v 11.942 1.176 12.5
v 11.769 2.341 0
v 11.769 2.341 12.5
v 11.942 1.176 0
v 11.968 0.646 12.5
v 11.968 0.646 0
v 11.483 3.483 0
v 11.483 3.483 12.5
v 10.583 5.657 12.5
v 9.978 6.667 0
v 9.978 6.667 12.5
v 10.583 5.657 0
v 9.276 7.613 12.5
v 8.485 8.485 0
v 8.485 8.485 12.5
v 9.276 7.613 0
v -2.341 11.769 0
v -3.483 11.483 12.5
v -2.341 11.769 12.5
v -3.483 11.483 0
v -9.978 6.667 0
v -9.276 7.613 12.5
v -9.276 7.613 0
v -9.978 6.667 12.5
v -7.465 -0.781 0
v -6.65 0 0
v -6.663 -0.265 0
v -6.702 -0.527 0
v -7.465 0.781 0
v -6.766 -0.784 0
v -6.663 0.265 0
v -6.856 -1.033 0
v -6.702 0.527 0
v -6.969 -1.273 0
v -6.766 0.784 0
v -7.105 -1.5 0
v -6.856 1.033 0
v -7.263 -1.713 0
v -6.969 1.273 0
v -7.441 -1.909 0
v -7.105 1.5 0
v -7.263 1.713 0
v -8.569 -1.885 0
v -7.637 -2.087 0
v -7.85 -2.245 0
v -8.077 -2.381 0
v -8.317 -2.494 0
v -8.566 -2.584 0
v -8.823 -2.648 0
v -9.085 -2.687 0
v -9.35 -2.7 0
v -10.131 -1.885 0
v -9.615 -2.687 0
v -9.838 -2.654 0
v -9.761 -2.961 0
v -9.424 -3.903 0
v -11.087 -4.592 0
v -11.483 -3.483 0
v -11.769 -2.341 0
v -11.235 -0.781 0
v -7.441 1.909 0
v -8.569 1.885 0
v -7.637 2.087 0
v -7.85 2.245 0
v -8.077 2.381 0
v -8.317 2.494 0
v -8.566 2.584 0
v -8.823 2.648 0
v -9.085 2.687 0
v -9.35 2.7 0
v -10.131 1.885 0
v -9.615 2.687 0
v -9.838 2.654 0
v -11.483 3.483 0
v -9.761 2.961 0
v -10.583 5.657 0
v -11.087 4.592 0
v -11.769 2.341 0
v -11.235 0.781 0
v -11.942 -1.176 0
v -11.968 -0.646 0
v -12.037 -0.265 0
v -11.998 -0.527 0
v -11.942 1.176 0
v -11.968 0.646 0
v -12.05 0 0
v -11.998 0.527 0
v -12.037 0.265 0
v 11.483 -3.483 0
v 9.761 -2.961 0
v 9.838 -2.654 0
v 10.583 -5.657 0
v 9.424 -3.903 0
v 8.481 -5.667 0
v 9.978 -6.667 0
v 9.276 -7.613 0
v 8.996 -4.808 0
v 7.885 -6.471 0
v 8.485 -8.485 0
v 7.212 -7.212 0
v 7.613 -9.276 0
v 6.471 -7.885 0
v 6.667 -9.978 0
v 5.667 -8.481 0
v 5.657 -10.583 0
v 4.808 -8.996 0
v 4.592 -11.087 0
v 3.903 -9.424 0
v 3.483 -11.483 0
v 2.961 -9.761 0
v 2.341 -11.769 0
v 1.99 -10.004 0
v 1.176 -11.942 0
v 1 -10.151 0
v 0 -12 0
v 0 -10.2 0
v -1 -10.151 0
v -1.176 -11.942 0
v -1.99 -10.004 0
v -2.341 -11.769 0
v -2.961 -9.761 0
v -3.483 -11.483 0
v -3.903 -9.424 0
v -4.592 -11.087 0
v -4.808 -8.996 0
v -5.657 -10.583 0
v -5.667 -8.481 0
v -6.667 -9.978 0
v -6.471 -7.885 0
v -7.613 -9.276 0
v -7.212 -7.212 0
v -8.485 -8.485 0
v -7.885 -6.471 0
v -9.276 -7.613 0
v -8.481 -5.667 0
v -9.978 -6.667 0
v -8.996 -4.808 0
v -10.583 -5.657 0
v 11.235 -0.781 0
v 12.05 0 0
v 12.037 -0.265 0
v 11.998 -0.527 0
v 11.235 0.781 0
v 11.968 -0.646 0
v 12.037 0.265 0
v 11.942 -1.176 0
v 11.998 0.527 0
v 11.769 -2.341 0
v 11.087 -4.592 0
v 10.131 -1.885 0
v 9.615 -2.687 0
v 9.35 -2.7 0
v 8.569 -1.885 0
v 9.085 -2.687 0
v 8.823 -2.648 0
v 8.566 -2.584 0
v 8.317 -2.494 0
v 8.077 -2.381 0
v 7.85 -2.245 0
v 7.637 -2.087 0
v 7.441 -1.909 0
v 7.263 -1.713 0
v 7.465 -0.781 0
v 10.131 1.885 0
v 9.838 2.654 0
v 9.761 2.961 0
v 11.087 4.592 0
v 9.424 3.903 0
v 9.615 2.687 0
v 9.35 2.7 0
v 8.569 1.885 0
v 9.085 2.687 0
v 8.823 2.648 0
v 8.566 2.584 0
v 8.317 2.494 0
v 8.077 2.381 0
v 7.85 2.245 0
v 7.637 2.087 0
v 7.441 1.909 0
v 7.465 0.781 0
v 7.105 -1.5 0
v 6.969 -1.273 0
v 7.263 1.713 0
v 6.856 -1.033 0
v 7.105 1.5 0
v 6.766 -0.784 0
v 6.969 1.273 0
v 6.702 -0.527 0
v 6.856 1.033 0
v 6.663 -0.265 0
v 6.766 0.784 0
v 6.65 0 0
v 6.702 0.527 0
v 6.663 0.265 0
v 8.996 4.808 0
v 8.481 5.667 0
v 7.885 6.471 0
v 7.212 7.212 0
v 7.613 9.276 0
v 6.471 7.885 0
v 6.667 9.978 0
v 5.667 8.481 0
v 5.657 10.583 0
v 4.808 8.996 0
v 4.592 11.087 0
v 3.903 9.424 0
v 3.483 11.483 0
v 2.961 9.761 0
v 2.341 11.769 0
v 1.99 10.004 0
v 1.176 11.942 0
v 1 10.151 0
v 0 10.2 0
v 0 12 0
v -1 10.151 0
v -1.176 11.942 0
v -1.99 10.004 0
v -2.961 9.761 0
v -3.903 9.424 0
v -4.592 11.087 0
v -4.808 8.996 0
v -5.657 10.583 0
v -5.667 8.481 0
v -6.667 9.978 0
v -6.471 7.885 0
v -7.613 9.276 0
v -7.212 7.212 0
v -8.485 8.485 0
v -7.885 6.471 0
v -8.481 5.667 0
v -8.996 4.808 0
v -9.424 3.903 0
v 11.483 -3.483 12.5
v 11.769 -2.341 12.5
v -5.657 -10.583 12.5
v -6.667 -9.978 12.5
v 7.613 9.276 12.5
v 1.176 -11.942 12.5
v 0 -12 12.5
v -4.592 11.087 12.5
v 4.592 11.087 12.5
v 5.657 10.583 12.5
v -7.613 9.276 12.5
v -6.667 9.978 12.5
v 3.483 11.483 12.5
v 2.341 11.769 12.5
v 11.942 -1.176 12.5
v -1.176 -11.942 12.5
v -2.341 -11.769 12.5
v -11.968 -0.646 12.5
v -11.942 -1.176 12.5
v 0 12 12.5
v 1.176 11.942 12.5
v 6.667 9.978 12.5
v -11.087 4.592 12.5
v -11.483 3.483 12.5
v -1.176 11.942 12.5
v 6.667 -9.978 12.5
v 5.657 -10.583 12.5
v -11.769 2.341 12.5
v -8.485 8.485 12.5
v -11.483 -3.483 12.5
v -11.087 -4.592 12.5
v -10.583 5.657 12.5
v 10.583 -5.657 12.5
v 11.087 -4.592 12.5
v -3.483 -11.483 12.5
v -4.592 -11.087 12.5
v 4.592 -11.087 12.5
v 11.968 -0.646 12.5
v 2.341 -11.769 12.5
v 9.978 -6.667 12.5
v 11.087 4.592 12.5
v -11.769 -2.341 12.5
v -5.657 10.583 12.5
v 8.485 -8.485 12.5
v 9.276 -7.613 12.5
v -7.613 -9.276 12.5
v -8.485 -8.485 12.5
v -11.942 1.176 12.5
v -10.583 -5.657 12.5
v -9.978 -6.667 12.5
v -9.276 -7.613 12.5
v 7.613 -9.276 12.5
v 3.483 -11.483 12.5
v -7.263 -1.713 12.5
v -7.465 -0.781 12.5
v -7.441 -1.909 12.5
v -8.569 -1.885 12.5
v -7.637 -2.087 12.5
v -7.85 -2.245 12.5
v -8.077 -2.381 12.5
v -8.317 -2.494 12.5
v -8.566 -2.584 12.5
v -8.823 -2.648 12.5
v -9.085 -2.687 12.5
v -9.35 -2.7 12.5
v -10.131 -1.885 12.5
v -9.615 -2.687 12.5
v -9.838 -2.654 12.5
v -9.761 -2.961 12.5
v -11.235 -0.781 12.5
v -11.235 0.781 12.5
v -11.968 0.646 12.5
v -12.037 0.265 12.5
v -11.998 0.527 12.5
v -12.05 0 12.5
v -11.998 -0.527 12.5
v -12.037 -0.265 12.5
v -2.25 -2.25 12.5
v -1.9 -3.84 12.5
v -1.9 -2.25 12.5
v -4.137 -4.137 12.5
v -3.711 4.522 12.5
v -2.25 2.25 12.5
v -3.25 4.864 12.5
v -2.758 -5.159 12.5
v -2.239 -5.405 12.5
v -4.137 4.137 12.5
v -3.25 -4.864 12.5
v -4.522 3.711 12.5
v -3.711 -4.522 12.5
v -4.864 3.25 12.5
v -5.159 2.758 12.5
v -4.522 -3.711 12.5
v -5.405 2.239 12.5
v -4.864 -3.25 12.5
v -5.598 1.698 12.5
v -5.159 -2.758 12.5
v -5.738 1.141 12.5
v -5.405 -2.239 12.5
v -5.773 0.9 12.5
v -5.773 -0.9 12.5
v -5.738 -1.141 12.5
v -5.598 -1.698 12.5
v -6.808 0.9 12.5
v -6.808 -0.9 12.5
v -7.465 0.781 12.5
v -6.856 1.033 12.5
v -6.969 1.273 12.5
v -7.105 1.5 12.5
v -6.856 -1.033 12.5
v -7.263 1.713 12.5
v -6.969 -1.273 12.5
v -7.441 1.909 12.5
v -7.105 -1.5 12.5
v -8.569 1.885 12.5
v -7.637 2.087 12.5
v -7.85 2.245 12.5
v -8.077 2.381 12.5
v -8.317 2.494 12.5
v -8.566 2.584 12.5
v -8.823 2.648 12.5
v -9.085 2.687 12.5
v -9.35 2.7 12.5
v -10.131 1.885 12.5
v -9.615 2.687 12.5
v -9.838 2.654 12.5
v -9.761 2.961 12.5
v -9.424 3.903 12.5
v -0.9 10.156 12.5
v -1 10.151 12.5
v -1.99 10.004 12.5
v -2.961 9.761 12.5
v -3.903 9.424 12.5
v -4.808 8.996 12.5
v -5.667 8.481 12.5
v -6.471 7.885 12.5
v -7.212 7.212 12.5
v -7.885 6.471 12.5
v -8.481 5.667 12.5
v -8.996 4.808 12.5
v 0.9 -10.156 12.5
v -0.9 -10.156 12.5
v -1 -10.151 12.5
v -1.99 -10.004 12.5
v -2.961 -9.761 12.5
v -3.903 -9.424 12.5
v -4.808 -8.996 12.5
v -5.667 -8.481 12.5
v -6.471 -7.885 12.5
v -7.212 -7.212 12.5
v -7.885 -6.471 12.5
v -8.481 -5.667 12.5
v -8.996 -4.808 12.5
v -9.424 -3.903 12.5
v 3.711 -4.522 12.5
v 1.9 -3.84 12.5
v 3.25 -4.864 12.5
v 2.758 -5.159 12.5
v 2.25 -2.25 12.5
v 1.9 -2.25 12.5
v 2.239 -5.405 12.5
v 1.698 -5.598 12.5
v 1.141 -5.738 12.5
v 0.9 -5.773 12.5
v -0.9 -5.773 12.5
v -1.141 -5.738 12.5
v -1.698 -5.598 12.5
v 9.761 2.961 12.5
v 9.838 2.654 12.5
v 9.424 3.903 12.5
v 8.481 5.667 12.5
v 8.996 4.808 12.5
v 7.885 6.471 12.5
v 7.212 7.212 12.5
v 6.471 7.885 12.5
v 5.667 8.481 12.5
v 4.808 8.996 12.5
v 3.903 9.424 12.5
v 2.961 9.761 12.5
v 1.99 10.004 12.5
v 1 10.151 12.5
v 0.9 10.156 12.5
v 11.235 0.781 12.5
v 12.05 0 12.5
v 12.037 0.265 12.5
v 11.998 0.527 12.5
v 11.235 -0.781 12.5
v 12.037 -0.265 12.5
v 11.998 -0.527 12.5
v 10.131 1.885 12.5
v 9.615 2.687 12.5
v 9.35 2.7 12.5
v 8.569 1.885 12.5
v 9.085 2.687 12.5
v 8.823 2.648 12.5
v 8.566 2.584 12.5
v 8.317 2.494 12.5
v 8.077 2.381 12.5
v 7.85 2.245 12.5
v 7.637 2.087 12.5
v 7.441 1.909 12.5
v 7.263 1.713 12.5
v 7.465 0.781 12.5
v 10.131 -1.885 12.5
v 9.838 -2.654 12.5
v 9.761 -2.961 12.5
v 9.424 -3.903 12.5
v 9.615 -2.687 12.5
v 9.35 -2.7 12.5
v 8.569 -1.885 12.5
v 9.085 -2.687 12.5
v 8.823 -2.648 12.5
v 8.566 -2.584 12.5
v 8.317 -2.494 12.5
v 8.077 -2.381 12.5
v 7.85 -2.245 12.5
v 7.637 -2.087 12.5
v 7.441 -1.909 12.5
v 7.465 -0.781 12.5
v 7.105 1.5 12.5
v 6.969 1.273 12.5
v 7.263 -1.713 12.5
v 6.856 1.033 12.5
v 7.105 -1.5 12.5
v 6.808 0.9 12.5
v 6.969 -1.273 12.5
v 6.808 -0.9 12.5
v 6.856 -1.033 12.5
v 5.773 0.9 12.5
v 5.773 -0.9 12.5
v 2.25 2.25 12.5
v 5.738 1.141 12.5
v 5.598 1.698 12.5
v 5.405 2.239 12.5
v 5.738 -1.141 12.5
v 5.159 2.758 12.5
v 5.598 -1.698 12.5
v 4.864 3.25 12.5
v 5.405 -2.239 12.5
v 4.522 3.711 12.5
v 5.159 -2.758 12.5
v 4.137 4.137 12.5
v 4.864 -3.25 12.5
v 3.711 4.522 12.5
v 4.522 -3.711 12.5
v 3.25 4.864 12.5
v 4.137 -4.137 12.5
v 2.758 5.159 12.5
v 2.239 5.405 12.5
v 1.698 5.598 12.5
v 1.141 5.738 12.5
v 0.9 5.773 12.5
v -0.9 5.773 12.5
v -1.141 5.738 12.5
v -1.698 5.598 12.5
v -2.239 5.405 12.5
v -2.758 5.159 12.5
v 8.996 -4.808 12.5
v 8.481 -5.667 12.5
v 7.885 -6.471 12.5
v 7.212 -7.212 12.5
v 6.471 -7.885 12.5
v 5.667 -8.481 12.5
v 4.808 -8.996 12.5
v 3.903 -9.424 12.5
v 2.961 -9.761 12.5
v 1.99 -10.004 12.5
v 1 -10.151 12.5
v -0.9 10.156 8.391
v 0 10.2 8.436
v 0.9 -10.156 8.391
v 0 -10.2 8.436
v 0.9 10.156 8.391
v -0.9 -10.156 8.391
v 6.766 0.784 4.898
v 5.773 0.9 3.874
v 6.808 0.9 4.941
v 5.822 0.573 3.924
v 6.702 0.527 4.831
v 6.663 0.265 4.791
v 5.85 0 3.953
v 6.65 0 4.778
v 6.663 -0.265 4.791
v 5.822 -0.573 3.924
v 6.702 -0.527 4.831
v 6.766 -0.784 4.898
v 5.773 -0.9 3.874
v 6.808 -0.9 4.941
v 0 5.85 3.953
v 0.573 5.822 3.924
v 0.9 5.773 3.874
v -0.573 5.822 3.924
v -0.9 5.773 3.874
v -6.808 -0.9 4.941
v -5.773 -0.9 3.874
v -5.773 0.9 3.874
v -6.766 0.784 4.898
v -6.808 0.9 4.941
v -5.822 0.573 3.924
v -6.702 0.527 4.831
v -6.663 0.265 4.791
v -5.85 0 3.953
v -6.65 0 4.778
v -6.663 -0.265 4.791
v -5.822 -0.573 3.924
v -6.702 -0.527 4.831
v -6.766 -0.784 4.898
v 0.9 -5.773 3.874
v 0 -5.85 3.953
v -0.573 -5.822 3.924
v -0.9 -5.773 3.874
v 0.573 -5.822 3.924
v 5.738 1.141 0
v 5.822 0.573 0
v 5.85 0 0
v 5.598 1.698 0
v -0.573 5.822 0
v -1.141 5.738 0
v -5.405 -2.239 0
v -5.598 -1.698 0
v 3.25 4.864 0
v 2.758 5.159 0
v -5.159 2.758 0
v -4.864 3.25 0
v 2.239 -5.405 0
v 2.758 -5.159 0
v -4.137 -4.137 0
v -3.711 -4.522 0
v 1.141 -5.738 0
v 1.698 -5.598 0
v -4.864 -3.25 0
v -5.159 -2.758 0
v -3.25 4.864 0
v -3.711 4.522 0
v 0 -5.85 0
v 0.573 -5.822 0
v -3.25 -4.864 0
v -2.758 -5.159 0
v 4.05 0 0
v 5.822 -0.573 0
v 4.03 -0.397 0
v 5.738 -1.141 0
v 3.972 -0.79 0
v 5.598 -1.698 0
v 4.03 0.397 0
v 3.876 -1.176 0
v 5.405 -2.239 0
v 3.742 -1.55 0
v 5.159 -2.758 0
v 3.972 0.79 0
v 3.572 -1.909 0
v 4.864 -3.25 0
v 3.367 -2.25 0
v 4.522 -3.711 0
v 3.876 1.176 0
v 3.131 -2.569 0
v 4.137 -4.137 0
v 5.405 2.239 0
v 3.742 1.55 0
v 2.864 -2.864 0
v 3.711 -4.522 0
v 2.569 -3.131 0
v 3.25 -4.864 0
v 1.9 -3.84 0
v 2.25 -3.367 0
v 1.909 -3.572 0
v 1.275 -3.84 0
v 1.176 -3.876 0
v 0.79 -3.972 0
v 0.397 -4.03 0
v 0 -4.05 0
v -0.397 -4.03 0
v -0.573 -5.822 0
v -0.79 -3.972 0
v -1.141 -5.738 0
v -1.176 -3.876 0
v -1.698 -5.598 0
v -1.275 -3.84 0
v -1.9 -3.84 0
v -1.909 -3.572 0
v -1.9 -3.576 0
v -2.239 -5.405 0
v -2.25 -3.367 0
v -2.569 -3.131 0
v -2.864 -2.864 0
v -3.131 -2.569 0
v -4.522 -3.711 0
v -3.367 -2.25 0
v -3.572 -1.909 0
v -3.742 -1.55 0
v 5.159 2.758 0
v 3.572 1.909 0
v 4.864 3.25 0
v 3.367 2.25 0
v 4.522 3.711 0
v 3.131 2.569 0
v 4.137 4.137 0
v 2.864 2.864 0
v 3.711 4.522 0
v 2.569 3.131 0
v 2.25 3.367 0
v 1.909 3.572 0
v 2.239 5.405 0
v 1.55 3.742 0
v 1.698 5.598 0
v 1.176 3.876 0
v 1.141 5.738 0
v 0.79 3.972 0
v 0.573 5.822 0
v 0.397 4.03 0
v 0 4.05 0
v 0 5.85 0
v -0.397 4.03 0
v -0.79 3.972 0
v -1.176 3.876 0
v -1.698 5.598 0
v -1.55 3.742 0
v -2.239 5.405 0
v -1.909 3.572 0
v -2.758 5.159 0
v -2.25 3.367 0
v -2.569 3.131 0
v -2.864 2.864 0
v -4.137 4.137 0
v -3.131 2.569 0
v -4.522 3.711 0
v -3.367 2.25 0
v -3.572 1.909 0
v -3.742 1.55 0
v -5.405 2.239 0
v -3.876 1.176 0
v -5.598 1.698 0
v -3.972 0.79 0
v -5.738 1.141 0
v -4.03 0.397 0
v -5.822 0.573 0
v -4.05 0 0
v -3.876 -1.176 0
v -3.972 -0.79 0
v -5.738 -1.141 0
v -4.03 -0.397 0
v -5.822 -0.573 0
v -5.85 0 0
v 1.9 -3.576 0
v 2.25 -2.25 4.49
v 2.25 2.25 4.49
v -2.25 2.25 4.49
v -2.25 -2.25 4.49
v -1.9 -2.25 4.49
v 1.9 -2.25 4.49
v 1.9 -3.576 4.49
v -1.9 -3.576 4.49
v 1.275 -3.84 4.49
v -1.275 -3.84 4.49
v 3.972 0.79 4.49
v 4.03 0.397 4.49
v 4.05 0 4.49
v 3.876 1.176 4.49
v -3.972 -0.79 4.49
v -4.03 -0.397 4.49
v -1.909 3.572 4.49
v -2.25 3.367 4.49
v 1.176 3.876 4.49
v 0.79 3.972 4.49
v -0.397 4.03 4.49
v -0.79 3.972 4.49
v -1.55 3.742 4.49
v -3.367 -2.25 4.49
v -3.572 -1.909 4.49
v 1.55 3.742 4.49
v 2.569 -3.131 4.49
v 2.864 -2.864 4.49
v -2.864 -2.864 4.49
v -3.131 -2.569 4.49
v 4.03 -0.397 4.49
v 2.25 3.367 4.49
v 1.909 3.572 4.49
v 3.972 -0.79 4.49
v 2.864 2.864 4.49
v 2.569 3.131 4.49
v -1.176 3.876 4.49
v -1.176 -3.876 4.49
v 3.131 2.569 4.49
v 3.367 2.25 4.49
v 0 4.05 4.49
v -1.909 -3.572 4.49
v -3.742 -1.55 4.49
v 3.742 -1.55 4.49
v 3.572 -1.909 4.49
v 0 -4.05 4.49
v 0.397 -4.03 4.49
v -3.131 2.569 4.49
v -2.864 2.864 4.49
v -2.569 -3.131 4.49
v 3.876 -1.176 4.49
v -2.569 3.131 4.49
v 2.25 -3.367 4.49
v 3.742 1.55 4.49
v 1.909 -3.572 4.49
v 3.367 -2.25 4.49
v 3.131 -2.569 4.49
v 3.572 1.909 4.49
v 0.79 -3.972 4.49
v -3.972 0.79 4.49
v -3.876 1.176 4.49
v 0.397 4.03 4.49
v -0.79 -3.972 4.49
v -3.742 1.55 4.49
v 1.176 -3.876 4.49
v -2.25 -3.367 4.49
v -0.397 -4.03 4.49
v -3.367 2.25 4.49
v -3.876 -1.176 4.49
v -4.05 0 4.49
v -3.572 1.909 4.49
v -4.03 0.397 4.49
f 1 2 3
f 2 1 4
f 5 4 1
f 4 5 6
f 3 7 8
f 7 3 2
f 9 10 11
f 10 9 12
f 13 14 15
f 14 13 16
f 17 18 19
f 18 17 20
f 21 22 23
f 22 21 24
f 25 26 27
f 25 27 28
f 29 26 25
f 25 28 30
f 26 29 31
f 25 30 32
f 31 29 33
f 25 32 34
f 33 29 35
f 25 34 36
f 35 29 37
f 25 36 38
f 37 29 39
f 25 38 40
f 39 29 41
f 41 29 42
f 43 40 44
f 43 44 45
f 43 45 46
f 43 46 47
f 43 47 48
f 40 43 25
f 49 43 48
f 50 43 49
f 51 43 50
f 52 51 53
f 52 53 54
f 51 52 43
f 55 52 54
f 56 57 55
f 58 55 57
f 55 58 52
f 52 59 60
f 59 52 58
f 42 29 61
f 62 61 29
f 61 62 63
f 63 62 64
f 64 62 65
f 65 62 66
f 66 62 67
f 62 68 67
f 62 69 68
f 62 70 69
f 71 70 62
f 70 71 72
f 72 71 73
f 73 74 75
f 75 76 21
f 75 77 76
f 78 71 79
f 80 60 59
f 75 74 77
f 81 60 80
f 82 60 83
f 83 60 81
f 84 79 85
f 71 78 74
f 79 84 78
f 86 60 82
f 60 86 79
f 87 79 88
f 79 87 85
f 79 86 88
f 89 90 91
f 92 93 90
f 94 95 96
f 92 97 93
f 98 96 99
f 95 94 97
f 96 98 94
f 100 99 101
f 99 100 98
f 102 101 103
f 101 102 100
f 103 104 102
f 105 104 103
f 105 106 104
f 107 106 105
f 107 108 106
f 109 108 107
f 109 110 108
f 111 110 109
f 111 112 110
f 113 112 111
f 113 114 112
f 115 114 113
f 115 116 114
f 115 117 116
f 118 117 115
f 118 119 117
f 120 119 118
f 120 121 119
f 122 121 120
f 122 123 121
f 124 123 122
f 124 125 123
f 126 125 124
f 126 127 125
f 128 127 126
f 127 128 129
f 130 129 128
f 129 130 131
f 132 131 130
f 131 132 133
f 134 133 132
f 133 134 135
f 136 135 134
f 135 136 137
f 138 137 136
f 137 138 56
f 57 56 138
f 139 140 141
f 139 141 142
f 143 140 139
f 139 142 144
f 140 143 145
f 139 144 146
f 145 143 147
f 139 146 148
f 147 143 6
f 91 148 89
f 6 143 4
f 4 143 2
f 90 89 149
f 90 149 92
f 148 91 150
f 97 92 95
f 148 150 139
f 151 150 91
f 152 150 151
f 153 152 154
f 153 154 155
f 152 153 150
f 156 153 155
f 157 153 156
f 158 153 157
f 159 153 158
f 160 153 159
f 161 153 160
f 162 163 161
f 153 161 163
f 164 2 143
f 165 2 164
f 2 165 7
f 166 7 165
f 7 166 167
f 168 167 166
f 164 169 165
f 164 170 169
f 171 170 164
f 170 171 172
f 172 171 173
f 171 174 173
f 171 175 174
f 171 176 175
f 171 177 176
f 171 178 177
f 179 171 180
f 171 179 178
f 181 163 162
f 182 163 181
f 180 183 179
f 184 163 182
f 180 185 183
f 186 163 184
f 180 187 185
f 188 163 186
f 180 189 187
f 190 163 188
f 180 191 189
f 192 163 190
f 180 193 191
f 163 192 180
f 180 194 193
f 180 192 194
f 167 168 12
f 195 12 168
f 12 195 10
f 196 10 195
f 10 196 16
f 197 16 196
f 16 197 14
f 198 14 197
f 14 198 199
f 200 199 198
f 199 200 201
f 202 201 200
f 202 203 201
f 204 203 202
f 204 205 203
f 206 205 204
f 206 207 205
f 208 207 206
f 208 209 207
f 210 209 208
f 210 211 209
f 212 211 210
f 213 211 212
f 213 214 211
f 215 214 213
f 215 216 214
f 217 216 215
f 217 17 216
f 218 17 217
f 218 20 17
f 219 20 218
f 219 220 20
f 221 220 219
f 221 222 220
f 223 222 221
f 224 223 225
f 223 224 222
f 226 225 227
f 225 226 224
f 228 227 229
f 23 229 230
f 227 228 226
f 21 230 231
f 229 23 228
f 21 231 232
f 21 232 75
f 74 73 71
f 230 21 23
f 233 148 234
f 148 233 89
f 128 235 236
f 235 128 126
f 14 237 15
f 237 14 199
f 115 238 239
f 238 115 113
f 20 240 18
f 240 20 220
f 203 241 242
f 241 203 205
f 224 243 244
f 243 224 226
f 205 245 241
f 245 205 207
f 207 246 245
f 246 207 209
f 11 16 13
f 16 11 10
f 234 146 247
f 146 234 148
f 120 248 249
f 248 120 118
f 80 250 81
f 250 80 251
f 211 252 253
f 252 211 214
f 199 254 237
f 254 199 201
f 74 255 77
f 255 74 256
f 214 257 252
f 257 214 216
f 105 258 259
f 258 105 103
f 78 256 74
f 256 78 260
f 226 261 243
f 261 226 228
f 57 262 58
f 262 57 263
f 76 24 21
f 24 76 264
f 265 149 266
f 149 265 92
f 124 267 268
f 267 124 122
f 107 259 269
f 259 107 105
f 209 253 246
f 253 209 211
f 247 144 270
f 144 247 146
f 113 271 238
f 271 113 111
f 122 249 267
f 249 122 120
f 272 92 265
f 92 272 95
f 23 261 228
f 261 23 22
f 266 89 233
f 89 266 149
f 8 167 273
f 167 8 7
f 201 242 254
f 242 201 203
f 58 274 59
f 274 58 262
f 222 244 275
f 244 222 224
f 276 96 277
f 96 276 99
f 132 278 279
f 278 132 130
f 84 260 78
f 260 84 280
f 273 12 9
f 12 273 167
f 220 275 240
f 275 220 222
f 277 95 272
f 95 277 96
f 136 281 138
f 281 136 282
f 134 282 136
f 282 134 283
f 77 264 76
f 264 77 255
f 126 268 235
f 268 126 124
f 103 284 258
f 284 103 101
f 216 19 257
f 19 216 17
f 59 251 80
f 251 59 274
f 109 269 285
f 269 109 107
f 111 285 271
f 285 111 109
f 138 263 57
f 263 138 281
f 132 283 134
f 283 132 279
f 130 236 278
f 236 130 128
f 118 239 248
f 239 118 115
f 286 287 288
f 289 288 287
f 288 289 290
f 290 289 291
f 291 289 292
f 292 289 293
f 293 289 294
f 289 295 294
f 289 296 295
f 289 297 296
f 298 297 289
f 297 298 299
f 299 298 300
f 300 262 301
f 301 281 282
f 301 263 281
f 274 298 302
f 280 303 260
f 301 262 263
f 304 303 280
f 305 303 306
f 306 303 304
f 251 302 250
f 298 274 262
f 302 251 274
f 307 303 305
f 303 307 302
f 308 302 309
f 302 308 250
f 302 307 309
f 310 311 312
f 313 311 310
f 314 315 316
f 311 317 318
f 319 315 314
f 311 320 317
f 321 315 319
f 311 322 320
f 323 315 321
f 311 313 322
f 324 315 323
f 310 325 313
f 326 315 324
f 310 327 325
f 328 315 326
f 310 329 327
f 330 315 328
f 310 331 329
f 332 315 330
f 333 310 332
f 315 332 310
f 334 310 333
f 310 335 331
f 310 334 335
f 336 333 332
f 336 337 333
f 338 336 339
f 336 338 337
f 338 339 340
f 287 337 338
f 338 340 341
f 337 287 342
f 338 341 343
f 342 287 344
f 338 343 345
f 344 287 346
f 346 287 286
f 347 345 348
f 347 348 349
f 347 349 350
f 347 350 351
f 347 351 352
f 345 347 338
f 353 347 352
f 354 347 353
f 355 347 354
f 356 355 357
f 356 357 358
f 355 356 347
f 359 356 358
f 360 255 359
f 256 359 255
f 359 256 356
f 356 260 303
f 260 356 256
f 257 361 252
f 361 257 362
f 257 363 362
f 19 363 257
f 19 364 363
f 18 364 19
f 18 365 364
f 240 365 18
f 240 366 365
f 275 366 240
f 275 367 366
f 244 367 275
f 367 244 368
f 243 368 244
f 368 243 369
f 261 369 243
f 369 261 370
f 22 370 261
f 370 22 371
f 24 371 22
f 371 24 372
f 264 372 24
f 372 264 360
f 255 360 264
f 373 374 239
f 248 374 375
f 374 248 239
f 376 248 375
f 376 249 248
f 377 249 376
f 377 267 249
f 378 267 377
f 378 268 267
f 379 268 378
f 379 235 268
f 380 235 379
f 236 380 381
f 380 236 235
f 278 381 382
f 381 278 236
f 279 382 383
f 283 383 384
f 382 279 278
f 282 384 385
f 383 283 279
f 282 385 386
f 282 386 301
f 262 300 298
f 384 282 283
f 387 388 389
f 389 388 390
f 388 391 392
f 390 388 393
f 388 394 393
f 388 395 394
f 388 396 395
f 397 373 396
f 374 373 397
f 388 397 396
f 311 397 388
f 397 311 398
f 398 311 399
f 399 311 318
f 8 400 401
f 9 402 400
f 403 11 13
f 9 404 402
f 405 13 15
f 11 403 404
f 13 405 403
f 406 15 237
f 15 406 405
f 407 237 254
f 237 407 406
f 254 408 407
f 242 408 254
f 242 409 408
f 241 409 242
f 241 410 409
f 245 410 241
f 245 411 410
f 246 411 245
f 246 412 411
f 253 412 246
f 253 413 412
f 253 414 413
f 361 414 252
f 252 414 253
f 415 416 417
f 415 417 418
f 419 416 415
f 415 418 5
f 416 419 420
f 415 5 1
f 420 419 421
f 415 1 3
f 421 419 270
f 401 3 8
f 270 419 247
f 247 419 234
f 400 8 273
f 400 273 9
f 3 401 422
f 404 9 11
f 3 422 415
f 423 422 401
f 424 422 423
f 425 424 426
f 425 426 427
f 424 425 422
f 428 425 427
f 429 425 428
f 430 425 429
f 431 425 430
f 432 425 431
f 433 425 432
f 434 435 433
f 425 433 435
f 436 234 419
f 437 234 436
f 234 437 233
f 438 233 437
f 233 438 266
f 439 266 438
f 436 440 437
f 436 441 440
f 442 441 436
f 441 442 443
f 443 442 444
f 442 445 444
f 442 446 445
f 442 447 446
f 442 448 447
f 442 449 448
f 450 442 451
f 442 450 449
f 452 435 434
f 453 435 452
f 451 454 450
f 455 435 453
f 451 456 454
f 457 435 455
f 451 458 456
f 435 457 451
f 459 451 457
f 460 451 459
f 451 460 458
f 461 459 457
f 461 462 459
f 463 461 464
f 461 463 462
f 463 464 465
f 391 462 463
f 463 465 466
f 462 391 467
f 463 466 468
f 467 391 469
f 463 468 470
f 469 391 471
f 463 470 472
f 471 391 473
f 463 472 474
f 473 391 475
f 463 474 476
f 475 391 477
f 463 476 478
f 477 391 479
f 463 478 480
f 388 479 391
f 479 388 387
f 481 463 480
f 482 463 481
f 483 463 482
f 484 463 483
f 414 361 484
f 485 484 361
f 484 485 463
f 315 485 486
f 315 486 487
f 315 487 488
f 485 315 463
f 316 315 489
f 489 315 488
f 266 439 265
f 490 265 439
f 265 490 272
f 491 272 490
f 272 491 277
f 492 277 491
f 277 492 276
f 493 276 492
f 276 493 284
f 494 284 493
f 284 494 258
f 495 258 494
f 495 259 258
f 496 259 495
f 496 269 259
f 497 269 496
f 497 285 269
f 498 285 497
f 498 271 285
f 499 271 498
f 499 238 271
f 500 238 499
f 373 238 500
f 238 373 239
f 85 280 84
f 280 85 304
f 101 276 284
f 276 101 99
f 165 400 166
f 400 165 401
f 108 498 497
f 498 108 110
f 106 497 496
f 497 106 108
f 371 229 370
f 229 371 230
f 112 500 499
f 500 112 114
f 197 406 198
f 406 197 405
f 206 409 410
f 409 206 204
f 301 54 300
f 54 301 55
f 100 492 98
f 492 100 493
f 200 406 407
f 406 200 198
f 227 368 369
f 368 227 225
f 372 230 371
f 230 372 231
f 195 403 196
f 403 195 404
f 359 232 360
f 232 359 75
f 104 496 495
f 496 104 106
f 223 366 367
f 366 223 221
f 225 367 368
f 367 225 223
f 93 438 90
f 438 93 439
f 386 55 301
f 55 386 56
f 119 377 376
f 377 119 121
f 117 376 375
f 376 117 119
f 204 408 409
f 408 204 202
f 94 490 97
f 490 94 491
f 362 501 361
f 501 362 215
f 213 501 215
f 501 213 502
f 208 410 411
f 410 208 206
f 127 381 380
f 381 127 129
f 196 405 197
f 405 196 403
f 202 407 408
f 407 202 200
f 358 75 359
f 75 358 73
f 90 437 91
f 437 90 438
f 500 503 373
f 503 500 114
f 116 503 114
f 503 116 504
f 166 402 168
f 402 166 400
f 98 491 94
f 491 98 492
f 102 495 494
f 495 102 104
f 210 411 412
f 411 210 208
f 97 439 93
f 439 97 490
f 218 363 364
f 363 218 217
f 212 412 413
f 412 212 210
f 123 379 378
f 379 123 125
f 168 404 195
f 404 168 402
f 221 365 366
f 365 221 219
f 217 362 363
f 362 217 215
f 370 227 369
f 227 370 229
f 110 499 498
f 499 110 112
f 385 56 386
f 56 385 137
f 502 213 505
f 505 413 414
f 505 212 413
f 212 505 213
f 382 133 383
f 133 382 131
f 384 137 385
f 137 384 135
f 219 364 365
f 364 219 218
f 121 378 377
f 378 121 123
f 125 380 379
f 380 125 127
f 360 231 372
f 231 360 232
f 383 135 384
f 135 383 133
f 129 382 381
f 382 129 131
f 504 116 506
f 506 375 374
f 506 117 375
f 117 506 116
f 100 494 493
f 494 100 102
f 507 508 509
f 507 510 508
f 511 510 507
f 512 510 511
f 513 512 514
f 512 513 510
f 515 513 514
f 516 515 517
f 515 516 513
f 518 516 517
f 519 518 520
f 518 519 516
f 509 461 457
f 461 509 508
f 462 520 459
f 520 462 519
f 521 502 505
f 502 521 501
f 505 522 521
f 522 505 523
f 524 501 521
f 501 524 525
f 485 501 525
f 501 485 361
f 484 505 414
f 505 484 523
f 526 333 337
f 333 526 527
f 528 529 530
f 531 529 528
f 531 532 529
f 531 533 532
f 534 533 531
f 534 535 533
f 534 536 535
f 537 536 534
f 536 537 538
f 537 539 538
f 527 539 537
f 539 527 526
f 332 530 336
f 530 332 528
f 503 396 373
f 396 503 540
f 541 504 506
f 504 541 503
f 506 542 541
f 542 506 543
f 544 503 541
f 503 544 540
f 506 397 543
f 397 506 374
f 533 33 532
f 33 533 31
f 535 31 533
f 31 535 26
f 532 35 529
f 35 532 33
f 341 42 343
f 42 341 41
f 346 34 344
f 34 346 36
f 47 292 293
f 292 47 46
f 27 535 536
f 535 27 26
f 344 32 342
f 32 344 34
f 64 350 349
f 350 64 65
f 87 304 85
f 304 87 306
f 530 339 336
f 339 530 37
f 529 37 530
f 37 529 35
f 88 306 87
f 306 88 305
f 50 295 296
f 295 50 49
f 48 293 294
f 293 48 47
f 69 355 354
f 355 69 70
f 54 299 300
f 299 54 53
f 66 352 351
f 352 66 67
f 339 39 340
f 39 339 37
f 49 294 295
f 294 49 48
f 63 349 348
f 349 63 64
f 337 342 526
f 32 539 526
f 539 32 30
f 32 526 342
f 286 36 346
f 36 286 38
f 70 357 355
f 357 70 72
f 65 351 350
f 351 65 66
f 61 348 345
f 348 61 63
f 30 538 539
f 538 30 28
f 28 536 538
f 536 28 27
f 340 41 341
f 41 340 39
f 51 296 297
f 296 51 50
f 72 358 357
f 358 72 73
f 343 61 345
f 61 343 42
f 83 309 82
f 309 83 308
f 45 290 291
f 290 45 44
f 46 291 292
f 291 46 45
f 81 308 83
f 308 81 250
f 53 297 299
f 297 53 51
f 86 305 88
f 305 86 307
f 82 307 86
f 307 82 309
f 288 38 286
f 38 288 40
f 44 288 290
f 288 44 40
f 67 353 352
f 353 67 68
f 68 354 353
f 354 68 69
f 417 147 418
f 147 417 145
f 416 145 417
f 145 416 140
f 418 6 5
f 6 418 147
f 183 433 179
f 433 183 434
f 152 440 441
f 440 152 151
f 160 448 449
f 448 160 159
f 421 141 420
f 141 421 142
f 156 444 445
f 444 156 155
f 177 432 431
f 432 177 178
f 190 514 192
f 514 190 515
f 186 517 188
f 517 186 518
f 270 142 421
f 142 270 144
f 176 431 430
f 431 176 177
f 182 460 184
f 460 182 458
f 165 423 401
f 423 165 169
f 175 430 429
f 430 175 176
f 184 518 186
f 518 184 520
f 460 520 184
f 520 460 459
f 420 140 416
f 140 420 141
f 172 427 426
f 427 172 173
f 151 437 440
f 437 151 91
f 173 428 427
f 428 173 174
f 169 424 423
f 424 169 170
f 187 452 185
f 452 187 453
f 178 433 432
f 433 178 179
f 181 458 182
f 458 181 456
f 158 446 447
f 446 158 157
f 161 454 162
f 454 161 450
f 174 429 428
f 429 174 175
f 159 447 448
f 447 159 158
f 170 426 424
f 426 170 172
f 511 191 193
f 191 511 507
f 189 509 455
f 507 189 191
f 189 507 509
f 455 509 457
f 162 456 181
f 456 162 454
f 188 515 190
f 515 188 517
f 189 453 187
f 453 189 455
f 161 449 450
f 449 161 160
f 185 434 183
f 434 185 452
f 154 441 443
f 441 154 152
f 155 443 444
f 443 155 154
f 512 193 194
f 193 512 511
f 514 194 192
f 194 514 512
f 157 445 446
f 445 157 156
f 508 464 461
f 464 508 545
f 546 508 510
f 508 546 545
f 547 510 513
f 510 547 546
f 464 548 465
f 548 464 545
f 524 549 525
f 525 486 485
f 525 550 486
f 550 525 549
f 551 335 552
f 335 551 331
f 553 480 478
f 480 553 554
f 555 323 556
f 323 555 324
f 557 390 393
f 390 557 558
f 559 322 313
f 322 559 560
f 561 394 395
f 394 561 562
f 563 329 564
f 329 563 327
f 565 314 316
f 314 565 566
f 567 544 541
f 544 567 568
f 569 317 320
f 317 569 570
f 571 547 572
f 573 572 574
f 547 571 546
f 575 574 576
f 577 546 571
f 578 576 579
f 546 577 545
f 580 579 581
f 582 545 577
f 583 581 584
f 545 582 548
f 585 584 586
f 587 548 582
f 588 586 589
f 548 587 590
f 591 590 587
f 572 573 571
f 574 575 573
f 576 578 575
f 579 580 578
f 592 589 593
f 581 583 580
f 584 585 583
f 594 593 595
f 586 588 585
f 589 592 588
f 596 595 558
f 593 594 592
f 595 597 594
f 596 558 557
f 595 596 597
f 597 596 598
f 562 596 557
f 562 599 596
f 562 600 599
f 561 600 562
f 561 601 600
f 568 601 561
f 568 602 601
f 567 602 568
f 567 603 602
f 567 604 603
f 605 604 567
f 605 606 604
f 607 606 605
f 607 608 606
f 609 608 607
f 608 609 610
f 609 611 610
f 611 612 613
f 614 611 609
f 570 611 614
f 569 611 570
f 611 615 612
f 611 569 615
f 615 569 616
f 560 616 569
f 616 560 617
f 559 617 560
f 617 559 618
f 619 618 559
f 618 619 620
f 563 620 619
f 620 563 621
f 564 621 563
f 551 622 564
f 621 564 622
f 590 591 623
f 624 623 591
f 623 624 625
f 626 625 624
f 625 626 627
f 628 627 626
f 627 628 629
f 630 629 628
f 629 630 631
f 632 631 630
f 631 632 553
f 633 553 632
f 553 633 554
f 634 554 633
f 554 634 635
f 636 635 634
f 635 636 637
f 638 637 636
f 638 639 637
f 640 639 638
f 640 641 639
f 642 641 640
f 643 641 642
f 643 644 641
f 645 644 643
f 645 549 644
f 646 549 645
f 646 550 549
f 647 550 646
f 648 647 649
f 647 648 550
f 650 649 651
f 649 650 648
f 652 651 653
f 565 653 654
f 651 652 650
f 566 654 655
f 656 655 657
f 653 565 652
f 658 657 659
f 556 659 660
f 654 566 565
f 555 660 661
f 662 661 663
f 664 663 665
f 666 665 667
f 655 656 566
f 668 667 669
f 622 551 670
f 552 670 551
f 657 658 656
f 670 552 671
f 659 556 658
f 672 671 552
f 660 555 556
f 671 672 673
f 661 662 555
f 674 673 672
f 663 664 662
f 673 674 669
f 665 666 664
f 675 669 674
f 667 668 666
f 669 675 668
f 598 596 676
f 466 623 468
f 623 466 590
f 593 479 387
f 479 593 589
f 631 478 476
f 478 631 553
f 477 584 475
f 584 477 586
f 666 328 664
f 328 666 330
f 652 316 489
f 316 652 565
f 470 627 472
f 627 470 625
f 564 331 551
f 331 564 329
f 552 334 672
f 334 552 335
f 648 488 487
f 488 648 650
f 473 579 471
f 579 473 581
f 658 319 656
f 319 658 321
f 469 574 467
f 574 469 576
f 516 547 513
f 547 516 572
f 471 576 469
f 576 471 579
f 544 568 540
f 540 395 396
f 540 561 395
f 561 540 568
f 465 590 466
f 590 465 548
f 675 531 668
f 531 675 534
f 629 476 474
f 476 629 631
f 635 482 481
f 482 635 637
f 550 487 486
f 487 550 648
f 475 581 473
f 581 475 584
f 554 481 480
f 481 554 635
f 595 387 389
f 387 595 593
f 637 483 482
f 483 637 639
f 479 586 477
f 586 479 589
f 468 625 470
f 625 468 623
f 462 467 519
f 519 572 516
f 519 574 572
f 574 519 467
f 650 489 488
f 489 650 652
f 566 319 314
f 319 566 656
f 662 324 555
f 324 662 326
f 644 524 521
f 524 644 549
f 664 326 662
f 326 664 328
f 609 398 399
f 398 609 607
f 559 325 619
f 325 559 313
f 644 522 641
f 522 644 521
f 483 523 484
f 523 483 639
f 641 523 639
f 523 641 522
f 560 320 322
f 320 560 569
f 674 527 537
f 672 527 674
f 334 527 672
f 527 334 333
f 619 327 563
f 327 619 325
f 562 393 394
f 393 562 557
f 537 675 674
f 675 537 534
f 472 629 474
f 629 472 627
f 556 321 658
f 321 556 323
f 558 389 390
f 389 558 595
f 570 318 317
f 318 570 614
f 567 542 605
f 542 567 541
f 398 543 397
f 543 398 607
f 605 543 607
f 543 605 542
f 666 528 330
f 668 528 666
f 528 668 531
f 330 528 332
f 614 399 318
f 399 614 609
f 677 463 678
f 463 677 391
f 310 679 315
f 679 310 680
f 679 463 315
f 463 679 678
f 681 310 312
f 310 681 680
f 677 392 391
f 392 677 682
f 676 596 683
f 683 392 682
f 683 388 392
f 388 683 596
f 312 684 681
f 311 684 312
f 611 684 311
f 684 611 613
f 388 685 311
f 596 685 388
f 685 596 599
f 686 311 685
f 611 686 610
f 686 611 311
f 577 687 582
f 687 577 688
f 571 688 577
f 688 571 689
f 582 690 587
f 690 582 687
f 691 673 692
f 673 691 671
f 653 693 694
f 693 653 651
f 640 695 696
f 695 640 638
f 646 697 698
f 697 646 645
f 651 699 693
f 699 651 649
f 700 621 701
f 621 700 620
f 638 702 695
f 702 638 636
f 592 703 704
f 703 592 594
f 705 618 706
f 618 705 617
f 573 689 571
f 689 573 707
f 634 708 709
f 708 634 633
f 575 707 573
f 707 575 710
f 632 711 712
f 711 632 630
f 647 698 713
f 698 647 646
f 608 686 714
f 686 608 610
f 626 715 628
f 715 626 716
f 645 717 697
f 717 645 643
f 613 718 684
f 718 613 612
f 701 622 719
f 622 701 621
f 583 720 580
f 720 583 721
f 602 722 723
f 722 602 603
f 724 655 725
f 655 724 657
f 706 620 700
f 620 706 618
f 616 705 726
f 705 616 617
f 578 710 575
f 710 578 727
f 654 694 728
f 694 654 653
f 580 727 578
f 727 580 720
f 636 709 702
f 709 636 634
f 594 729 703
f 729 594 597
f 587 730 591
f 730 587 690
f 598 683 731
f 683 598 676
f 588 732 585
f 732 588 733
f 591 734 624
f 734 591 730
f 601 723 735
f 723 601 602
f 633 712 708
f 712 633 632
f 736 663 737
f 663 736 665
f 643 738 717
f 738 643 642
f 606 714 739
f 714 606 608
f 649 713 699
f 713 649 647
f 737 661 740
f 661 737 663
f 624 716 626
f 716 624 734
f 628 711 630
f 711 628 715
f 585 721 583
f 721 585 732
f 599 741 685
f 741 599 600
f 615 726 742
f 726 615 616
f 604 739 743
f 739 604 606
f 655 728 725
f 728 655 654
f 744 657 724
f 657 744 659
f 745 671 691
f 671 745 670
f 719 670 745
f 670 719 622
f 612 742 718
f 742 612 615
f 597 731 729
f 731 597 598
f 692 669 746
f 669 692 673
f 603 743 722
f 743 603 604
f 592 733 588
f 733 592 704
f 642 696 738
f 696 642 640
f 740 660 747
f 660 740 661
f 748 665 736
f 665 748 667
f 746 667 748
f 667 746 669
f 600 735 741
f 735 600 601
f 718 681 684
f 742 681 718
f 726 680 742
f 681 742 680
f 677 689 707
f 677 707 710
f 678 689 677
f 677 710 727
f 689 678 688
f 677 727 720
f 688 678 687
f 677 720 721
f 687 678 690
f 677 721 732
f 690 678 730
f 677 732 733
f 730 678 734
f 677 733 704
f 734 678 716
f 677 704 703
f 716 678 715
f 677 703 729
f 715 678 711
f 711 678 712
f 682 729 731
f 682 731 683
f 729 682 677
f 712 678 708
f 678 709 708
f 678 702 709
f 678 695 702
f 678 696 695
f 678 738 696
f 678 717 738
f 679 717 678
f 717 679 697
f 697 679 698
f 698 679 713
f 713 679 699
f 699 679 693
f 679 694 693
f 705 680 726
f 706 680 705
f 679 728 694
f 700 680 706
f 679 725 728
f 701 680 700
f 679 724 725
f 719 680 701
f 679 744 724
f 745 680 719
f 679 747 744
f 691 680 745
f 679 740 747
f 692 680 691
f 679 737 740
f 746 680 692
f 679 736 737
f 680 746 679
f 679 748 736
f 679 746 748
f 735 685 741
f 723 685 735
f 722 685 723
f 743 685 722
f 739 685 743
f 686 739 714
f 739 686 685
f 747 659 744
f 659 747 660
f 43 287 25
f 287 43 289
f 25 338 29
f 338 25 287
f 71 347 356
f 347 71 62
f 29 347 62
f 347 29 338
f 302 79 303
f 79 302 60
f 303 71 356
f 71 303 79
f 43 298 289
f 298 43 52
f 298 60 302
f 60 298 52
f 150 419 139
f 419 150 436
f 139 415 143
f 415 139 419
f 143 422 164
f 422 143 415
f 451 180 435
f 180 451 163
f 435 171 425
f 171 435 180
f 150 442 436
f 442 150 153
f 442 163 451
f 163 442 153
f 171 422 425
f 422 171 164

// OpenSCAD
// file: ../library/m3_parts.scad
// m3_parts.scad - A collection of things useful when developing with M3 fasteners
// (c)2025 vik@diamondage.co.nz, released under the GPL V3 or later

m3_screw_rad=3.4/2; // M3 screw hole radius
m3_screw_head_rad=5.9/2;    // Radius of the average M3 posi screw head
m3_screw_head_height=2.4;
m3_nut_max_width=6.4;     // M3 Nut from point to point.
m3_pillar_max_width=5.9;    // M3 pillar width, point to point
m3_nut_height=2.5;
m3_nut_min_width=5.8;  // Nut from flat to flat

// NEMA17 motors are *technically* M3 parts...
nema17_screw_sep=31;
nema17_collar_rad=22.5/2;   // The raised collar around the NEMA output shaft
nema17_face_len=42;         // Length of the square face of a NEMA17 ignoring bevels

// Cavity for M3 nut that goes into the top of things. Slight overshoot to avoid booleans
module m3_nut_cavity(ht=m3_nut_height) {
    translate([0,0,0.01]) cylinder(h=ht+0.01,r=m3_nut_max_width/2,$fn=6);
}

// A nut cavity for putting underneath things, with a nod to overhangs
// Has a conical top to print without support. Projects very slightly down to remove boolean issues.
// Making it captive adds little bumps inside that make it hard to insert and remove the nut
module m3_nut_cavity_tapered(captive=false) {
    difference() {
        union() {
            // Tapered avity for m3 nut
            translate([0,0,-0.01]) cylinder(h=m3_nut_height+0.01,r=m3_nut_max_width/2,$fn=6);
            translate([0,0,m3_nut_height])
                cylinder(h=1,r1=m3_nut_max_width/2,r2=m3_screw_rad*1.2,$fn=6);
        }
        if (captive) {
            divot_rad=0.4;
            rotate([0,0,30]) translate([m3_nut_max_width*0.42,0,m3_nut_height/2])
                sphere(divot_rad);
            rotate([0,0,30+120]) translate([m3_nut_max_width*0.42,0,m3_nut_height/2])
                sphere(divot_rad);
            rotate([0,0,30-120]) translate([m3_nut_max_width*0.42,0,m3_nut_height/2])
                sphere(divot_rad);

        }
    }
}

// Nut  slot for M3 nut
module m3_nut_slot(l=100) {
    difference() {
        // Long slot
        translate([-m3_nut_max_width/2,-m3_nut_min_width/2,0])
            cube([m3_nut_max_width+l,m3_nut_min_width,m3_nut_height]);
        // Small knobs to retain nut
        translate([0.2,m3_nut_min_width/2,m3_nut_height/2]) sphere(0.5);
        translate([0.2,-m3_nut_min_width/2,m3_nut_height/2]) sphere(0.5);
    }
}

// Cavity for an M3 screw and screw head of specified length.
// Points down. Uses octagons so that it can be printed horizontally
module  m3_screw_cavity(screw_len,inverted=false) {
    difference() {
        // The screw hole and head assembly
        union() {
            rotate([180,0,360/16]) cylinder(h=screw_len,r=m3_screw_rad*1.2,$fn=8);
            // Rotate to make hole's flats parallel to axes. Tiny shift to fix booleans
            rotate([0,0,360/16]) translate([0,0,-0.001])
                cylinder(h=10,r=m3_screw_head_rad*1.2,$fn=8);
        }
        // If it's inverted, put a hollow cylinder in the head cavity lined up with the screw
       // hole as support. Stand off a bit so that it iwll separate cleanly.
        if (inverted) {
            translate([0,0.2]) rotate([0,0,360/16]) {
                // Hollow cylinder, extended downwards for a screwdriver shaft
                extend_downwards=100;
                translate([0,0,-extend_downwards]) difference() {
                    cylinder(h=screw_len+extend_downwards,r=m3_screw_rad*1.2+0.3,$fn=8);
                    cylinder(h=(screw_len+extend_downwards)*3,r=m3_screw_rad*1.2,$fn=8,center=true);
                }
            }
        }
    }
}


// Octagonal hole for screw, no head, centred, length extends up and down
module  m3_screw_hole(screw_len) {
    rotate([180,0,360/16]) cylinder(h=screw_len,r=m3_screw_rad*1.2,$fn=8,center=true);
}

m3_thumbscrew_height=5;
m3_thumbscrew_rad=5;
// Thumbscrew with ridges. Screw head fits in top depression, nut on screw
// shaft holds it in place.
//  rad: Optional radius for thumbscrew knob (default 5, see above)
module m3_thumbscrew_knob(rad=m3_thumbscrew_rad) {
    m3_thumbscrew_ridges=floor(rad*3.2);
    difference() {
        union() {
            for (i=[0:m3_thumbscrew_ridges]) rotate([0,0,360/m3_thumbscrew_ridges*i])
                translate([rad,0,m3_thumbscrew_height/2])
                    cube([1,1,m3_thumbscrew_height],center=true);
            cylinder(h=m3_thumbscrew_height,r=rad);
            translate([0,0,m3_thumbscrew_height])
                cylinder(m3_nut_height,r1=rad,r2=m3_nut_max_width/2+1);
        }
        translate([0,0,m3_thumbscrew_height]) m3_nut_cavity();
        translate([0,0,m3_screw_head_height]) rotate([180,0,0])
            m3_screw_cavity(m3_thumbscrew_height+m3_nut_height+1,inverted=true);
    }
}
// main file
// UV_Module_to_fibre.scad - Holds a 3W star UV module and a 125/9 fibre lead in close proximity
// Needs a couple of M3 fasteners. (c)2026 vik@olliver.family.gen.nz GPLv3 or later applies

include <../library/m3_parts.scad>

holder_int_rad=24/2;
holder_int_ht=12.5;
holder_expansion=0.4;
led_housing_rad=8.1/2;
wall=1.8;
inner_block_rad=led_housing_rad+wall;

$fn=64;

// A square fibre optic connector socket, height = very big.
plug_square=4.5;
tab_width=3.8;  // Dimensions of tab on side of optical plug.
tab_ht=1.6;
retaining_screw_sep=18.7;   // Distance M3 between screws

module fibre_socket() {
    verybig=999;
    translate([0,0,verybig/2]) {
        // Hole for fibre
        cube([plug_square,plug_square,verybig],center=true);
        // Slot for the tab on it.
        translate([0,0.01-(plug_square+tab_ht)/2,0]) cube([tab_width,tab_ht,verybig],center=true);
    }
}

module outer_with_fins() union() {
    // Ventilated outer
    difference() {
        cylinder(h=holder_int_ht,r=holder_int_rad);
        cylinder(h=holder_int_ht*3,r=holder_int_rad-wall,center=true);
    }
    // Support fins
    for (i=[0:3]) rotate([0,0,90*i]) translate([inner_block_rad-wall/4,-wall/2,holder_int_ht-wall*2]) hull() {
        cube([holder_int_rad-wall/2-inner_block_rad,wall,wall*2]);
        translate([0,0,-wall*3]) cube([0.01,wall,0.01]);
    }
    // M3 screw pillars
    translate([-retaining_screw_sep/2,0,0]) cylinder(h=holder_int_ht,r=m3_screw_rad+1);
    translate([retaining_screw_sep/2,0,0]) cylinder(h=holder_int_ht,r=m3_screw_rad+1);
}

// Bit that grips LED with a fibre socket in it.
difference() {
    union() {
        outer_with_fins();
        // Holder body
        cylinder(h=holder_int_ht,r=inner_block_rad);
    }
    // Hole for LED
    translate([0,0,-0.01]) cylinder(h=4.5,r=led_housing_rad);
    fibre_socket();
    // M3 screw holes
    translate([-retaining_screw_sep/2,0,0]) translate([0,0,holder_int_ht/2]) m3_screw_hole(holder_int_ht+1);
    translate([retaining_screw_sep/2,0,0]) translate([0,0,holder_int_ht/2]) m3_screw_hole(holder_int_ht+1);
}
